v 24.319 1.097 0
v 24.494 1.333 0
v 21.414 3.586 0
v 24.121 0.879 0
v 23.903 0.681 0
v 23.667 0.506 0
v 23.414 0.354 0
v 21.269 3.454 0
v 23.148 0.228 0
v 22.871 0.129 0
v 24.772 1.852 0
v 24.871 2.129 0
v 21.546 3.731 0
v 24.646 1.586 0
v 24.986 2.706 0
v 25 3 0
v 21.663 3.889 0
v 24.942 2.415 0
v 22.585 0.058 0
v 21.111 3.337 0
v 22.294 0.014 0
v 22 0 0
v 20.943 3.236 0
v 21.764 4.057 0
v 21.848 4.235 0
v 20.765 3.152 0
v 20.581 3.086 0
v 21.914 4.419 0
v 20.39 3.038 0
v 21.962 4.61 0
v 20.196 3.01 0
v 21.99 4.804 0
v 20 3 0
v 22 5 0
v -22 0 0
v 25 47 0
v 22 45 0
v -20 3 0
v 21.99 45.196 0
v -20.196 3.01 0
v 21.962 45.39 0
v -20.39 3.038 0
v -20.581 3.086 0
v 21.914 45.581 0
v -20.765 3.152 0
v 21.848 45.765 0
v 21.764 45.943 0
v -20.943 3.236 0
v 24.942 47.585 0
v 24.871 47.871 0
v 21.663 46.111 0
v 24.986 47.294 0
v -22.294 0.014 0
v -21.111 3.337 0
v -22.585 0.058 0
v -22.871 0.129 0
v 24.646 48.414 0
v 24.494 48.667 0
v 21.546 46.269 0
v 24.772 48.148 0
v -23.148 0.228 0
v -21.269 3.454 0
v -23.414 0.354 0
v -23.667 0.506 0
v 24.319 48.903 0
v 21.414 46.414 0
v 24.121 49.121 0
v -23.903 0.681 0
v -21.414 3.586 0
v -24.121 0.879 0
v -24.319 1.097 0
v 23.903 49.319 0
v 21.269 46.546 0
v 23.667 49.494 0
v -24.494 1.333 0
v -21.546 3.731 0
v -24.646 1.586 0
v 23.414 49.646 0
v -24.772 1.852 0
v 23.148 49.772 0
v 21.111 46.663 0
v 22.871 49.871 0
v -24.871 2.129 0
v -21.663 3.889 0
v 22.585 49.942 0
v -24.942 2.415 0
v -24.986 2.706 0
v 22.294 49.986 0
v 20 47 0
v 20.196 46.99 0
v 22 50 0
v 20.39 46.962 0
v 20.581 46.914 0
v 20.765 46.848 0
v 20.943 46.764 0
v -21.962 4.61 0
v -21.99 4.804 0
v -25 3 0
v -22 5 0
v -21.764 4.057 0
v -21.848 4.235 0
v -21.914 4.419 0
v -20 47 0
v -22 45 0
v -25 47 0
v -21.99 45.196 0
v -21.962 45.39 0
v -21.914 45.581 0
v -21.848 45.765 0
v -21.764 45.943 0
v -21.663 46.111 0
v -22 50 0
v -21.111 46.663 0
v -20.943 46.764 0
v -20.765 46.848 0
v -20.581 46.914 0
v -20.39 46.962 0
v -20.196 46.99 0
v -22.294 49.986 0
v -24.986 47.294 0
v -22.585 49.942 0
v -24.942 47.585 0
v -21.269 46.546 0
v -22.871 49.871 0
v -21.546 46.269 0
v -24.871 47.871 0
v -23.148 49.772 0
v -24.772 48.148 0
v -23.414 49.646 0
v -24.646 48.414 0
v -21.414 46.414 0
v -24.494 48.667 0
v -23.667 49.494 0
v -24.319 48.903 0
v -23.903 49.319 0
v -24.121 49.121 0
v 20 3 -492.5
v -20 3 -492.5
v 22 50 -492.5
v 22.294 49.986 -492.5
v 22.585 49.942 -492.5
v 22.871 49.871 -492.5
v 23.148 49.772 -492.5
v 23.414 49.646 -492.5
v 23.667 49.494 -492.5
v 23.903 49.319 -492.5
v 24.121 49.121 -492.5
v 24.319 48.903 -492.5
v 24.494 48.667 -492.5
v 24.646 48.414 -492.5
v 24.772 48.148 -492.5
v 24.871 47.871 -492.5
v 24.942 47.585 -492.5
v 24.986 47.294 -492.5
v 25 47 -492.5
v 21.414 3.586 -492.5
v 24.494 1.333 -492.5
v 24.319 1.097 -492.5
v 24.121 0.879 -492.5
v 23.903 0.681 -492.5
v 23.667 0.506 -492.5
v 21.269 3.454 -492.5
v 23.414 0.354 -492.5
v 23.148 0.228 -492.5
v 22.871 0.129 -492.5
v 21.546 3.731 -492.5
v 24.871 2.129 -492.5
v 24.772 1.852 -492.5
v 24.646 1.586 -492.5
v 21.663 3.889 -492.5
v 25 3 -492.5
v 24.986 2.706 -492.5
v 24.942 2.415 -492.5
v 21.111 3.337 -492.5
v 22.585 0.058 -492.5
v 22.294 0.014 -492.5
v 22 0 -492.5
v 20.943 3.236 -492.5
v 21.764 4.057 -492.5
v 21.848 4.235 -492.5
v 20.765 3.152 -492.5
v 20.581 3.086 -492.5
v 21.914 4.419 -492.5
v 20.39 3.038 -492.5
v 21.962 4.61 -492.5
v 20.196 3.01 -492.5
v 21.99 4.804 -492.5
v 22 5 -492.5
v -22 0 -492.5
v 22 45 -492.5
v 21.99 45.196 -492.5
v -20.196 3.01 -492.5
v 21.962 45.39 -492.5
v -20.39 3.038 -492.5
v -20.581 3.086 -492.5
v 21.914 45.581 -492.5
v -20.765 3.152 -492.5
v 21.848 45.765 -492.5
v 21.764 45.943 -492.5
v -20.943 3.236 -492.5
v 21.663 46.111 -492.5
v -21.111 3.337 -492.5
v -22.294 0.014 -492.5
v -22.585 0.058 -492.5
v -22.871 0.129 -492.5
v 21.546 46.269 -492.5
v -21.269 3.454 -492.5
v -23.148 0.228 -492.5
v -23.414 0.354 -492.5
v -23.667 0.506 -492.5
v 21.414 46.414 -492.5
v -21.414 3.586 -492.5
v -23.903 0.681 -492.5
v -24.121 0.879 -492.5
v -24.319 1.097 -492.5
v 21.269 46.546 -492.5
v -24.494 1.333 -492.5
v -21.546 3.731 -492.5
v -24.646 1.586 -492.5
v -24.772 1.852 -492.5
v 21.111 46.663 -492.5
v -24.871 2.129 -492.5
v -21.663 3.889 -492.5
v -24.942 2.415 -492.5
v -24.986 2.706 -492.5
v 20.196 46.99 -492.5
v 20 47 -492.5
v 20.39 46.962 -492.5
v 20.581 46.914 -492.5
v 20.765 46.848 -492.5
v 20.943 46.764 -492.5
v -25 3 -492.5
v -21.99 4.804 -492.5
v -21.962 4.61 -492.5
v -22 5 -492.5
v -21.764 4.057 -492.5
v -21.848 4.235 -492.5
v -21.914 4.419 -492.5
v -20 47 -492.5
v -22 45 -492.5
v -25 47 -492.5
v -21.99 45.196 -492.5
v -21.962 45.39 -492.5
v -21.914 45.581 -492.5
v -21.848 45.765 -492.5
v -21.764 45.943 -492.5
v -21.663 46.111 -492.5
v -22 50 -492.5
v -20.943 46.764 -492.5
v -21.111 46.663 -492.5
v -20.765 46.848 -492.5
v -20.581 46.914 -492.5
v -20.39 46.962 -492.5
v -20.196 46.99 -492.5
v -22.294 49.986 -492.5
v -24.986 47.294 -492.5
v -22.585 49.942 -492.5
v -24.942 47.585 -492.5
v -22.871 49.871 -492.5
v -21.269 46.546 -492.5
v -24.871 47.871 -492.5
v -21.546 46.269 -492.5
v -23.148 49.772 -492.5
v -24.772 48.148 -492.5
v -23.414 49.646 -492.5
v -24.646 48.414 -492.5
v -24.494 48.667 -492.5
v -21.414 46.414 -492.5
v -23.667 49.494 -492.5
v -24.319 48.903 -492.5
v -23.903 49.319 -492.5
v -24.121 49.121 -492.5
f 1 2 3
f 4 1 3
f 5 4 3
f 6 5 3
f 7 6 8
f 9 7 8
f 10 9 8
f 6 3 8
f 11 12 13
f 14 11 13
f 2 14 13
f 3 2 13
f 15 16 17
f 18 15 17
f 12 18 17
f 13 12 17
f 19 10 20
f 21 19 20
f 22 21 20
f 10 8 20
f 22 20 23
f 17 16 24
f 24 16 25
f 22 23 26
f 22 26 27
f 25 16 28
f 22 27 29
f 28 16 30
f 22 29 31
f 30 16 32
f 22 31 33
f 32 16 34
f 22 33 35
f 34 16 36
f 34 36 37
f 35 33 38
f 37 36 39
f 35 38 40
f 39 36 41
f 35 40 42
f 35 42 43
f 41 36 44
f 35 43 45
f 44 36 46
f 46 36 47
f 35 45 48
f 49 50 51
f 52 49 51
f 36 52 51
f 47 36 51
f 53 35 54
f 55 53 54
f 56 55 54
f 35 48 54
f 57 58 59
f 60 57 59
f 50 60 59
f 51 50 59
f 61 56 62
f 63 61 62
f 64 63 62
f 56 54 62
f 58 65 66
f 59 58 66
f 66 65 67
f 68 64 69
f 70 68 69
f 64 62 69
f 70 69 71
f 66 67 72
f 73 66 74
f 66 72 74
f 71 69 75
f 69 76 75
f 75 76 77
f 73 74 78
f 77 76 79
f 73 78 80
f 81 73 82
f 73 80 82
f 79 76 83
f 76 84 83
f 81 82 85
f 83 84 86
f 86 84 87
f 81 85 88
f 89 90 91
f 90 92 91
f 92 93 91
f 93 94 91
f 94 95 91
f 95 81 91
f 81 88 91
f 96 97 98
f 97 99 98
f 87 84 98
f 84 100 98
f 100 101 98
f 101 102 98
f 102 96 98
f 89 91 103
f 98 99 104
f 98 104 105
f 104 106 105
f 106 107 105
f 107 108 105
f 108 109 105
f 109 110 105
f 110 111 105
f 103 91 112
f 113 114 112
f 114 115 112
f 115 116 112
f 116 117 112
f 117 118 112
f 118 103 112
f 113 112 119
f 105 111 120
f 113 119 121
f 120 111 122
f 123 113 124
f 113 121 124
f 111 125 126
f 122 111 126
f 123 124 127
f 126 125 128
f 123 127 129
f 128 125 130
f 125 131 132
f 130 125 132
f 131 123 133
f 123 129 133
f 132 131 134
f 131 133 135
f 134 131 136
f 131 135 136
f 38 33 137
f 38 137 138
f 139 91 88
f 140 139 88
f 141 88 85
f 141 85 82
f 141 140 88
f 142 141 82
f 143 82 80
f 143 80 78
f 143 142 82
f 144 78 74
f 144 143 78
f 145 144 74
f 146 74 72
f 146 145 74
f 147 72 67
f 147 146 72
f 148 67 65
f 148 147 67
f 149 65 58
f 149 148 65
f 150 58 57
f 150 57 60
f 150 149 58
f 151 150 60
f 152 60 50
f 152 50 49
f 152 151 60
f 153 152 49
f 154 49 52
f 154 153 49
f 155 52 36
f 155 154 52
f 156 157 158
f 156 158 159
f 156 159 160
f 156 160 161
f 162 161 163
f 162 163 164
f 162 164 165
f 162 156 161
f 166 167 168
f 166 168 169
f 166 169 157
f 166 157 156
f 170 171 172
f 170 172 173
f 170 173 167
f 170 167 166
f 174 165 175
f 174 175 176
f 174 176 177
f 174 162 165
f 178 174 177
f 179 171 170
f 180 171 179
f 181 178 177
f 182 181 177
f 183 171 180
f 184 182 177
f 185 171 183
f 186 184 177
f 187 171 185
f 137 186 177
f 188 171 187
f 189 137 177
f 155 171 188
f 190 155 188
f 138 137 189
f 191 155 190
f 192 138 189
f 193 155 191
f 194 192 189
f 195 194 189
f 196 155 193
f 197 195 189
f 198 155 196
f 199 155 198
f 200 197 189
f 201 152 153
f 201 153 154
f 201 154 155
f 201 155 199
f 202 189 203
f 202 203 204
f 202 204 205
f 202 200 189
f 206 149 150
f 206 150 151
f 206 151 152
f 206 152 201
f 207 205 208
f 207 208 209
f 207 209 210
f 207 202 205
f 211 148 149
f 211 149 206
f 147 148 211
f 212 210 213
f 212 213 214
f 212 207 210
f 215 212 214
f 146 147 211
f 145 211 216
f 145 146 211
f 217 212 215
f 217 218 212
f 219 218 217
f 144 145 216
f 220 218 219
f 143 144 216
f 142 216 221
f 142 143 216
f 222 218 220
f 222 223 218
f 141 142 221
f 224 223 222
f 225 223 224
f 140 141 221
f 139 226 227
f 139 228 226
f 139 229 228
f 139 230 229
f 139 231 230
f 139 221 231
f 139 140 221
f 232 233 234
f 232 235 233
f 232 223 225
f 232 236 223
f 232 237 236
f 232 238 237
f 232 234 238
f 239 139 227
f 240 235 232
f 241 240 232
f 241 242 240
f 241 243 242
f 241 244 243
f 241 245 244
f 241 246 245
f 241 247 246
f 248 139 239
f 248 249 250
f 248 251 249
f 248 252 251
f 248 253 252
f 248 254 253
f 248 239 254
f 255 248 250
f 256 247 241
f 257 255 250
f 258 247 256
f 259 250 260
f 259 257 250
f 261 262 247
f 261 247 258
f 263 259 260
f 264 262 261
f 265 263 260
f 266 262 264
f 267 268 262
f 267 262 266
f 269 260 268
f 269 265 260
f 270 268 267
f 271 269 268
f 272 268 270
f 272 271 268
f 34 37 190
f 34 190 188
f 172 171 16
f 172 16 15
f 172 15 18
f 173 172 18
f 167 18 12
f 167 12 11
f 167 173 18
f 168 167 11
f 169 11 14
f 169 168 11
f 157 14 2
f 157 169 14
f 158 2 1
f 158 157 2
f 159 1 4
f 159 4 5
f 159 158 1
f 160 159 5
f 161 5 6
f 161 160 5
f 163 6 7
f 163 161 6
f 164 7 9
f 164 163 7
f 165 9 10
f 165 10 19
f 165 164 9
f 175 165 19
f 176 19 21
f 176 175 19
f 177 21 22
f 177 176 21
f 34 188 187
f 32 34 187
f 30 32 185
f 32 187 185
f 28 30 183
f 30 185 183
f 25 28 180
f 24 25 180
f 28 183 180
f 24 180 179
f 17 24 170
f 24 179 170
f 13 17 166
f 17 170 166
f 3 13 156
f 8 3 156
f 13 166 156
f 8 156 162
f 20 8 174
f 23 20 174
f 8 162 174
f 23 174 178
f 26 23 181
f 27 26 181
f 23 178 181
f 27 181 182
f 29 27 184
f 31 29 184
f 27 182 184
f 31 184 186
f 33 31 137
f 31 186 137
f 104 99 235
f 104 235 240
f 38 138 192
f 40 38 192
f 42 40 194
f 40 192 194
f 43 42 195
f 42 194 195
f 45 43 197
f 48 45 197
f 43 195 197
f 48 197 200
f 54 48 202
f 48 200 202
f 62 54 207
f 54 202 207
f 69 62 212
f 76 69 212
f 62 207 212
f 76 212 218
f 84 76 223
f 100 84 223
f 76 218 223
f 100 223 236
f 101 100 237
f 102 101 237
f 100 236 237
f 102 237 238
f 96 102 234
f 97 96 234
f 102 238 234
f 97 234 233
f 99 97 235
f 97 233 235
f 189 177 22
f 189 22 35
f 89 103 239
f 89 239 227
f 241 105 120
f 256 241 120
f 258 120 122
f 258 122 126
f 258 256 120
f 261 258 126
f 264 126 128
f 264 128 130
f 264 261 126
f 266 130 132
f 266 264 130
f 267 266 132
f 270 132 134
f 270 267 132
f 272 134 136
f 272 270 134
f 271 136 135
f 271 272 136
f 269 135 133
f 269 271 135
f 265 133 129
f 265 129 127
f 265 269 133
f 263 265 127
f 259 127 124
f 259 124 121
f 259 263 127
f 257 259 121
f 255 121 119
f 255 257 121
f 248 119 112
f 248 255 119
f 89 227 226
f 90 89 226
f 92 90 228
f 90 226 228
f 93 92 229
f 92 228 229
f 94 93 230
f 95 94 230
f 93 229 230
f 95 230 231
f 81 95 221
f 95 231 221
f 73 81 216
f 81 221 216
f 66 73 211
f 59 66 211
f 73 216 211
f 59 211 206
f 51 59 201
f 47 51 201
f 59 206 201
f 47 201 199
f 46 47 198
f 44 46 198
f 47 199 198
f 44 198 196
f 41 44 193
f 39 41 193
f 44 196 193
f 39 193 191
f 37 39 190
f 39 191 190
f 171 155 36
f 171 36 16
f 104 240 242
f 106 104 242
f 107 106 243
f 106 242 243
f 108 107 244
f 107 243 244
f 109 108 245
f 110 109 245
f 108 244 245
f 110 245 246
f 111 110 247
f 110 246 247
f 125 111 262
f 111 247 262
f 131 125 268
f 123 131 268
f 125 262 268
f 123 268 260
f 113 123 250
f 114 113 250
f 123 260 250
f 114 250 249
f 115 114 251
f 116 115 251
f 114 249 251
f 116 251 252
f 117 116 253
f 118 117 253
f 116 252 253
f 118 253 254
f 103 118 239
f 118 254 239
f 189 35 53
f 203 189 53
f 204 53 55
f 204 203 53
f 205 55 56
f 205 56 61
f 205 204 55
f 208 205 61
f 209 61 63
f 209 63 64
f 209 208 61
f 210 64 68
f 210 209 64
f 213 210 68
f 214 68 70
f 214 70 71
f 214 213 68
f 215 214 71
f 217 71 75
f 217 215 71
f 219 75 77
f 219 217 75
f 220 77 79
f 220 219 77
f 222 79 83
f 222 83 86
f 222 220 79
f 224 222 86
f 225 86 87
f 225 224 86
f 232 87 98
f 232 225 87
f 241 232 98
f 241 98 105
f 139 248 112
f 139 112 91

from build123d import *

# Parameters (mm, degrees)
EXTRUDE_START   = -492.5
EXTRUDE_1_DEPTH = 492.5


with BuildPart() as part:
    # Эскиз1 → Бобышка-Вытянуть1 (new body)
    with BuildSketch(Plane.XY.offset(EXTRUDE_START)):
        with BuildLine():
            Line((-22, 50), (22, 50))
            ThreePointArc((22, 50), (24.121320344, 49.121320344), (25, 47))
            Line((25, 47), (25, 3))
            ThreePointArc((25, 3), (24.121320344, 0.878679656), (22, 0))
            Line((22, 0), (-22, 0))
            ThreePointArc((-22, 0), (-24.121320344, 0.878679656), (-25, 3))
            Line((-25, 3), (-25, 47))
            ThreePointArc((-25, 47), (-24.121320344, 49.121320344), (-22, 50))
        make_face()
        with BuildLine():
            Line((-20, 47), (20, 47))
            ThreePointArc((20, 47), (21.414213562, 46.414213562), (22, 45))
            Line((22, 45), (22, 5))
            ThreePointArc((22, 5), (21.414213562, 3.585786438), (20, 3))
            Line((20, 3), (-20, 3))
            ThreePointArc((-20, 3), (-21.414213562, 3.585786438), (-22, 5))
            Line((-22, 5), (-22, 45))
            ThreePointArc((-22, 45), (-21.414213562, 46.414213562), (-20, 47))
        make_face(mode=Mode.SUBTRACT)
    extrude(amount=EXTRUDE_1_DEPTH)


solid = part.part
